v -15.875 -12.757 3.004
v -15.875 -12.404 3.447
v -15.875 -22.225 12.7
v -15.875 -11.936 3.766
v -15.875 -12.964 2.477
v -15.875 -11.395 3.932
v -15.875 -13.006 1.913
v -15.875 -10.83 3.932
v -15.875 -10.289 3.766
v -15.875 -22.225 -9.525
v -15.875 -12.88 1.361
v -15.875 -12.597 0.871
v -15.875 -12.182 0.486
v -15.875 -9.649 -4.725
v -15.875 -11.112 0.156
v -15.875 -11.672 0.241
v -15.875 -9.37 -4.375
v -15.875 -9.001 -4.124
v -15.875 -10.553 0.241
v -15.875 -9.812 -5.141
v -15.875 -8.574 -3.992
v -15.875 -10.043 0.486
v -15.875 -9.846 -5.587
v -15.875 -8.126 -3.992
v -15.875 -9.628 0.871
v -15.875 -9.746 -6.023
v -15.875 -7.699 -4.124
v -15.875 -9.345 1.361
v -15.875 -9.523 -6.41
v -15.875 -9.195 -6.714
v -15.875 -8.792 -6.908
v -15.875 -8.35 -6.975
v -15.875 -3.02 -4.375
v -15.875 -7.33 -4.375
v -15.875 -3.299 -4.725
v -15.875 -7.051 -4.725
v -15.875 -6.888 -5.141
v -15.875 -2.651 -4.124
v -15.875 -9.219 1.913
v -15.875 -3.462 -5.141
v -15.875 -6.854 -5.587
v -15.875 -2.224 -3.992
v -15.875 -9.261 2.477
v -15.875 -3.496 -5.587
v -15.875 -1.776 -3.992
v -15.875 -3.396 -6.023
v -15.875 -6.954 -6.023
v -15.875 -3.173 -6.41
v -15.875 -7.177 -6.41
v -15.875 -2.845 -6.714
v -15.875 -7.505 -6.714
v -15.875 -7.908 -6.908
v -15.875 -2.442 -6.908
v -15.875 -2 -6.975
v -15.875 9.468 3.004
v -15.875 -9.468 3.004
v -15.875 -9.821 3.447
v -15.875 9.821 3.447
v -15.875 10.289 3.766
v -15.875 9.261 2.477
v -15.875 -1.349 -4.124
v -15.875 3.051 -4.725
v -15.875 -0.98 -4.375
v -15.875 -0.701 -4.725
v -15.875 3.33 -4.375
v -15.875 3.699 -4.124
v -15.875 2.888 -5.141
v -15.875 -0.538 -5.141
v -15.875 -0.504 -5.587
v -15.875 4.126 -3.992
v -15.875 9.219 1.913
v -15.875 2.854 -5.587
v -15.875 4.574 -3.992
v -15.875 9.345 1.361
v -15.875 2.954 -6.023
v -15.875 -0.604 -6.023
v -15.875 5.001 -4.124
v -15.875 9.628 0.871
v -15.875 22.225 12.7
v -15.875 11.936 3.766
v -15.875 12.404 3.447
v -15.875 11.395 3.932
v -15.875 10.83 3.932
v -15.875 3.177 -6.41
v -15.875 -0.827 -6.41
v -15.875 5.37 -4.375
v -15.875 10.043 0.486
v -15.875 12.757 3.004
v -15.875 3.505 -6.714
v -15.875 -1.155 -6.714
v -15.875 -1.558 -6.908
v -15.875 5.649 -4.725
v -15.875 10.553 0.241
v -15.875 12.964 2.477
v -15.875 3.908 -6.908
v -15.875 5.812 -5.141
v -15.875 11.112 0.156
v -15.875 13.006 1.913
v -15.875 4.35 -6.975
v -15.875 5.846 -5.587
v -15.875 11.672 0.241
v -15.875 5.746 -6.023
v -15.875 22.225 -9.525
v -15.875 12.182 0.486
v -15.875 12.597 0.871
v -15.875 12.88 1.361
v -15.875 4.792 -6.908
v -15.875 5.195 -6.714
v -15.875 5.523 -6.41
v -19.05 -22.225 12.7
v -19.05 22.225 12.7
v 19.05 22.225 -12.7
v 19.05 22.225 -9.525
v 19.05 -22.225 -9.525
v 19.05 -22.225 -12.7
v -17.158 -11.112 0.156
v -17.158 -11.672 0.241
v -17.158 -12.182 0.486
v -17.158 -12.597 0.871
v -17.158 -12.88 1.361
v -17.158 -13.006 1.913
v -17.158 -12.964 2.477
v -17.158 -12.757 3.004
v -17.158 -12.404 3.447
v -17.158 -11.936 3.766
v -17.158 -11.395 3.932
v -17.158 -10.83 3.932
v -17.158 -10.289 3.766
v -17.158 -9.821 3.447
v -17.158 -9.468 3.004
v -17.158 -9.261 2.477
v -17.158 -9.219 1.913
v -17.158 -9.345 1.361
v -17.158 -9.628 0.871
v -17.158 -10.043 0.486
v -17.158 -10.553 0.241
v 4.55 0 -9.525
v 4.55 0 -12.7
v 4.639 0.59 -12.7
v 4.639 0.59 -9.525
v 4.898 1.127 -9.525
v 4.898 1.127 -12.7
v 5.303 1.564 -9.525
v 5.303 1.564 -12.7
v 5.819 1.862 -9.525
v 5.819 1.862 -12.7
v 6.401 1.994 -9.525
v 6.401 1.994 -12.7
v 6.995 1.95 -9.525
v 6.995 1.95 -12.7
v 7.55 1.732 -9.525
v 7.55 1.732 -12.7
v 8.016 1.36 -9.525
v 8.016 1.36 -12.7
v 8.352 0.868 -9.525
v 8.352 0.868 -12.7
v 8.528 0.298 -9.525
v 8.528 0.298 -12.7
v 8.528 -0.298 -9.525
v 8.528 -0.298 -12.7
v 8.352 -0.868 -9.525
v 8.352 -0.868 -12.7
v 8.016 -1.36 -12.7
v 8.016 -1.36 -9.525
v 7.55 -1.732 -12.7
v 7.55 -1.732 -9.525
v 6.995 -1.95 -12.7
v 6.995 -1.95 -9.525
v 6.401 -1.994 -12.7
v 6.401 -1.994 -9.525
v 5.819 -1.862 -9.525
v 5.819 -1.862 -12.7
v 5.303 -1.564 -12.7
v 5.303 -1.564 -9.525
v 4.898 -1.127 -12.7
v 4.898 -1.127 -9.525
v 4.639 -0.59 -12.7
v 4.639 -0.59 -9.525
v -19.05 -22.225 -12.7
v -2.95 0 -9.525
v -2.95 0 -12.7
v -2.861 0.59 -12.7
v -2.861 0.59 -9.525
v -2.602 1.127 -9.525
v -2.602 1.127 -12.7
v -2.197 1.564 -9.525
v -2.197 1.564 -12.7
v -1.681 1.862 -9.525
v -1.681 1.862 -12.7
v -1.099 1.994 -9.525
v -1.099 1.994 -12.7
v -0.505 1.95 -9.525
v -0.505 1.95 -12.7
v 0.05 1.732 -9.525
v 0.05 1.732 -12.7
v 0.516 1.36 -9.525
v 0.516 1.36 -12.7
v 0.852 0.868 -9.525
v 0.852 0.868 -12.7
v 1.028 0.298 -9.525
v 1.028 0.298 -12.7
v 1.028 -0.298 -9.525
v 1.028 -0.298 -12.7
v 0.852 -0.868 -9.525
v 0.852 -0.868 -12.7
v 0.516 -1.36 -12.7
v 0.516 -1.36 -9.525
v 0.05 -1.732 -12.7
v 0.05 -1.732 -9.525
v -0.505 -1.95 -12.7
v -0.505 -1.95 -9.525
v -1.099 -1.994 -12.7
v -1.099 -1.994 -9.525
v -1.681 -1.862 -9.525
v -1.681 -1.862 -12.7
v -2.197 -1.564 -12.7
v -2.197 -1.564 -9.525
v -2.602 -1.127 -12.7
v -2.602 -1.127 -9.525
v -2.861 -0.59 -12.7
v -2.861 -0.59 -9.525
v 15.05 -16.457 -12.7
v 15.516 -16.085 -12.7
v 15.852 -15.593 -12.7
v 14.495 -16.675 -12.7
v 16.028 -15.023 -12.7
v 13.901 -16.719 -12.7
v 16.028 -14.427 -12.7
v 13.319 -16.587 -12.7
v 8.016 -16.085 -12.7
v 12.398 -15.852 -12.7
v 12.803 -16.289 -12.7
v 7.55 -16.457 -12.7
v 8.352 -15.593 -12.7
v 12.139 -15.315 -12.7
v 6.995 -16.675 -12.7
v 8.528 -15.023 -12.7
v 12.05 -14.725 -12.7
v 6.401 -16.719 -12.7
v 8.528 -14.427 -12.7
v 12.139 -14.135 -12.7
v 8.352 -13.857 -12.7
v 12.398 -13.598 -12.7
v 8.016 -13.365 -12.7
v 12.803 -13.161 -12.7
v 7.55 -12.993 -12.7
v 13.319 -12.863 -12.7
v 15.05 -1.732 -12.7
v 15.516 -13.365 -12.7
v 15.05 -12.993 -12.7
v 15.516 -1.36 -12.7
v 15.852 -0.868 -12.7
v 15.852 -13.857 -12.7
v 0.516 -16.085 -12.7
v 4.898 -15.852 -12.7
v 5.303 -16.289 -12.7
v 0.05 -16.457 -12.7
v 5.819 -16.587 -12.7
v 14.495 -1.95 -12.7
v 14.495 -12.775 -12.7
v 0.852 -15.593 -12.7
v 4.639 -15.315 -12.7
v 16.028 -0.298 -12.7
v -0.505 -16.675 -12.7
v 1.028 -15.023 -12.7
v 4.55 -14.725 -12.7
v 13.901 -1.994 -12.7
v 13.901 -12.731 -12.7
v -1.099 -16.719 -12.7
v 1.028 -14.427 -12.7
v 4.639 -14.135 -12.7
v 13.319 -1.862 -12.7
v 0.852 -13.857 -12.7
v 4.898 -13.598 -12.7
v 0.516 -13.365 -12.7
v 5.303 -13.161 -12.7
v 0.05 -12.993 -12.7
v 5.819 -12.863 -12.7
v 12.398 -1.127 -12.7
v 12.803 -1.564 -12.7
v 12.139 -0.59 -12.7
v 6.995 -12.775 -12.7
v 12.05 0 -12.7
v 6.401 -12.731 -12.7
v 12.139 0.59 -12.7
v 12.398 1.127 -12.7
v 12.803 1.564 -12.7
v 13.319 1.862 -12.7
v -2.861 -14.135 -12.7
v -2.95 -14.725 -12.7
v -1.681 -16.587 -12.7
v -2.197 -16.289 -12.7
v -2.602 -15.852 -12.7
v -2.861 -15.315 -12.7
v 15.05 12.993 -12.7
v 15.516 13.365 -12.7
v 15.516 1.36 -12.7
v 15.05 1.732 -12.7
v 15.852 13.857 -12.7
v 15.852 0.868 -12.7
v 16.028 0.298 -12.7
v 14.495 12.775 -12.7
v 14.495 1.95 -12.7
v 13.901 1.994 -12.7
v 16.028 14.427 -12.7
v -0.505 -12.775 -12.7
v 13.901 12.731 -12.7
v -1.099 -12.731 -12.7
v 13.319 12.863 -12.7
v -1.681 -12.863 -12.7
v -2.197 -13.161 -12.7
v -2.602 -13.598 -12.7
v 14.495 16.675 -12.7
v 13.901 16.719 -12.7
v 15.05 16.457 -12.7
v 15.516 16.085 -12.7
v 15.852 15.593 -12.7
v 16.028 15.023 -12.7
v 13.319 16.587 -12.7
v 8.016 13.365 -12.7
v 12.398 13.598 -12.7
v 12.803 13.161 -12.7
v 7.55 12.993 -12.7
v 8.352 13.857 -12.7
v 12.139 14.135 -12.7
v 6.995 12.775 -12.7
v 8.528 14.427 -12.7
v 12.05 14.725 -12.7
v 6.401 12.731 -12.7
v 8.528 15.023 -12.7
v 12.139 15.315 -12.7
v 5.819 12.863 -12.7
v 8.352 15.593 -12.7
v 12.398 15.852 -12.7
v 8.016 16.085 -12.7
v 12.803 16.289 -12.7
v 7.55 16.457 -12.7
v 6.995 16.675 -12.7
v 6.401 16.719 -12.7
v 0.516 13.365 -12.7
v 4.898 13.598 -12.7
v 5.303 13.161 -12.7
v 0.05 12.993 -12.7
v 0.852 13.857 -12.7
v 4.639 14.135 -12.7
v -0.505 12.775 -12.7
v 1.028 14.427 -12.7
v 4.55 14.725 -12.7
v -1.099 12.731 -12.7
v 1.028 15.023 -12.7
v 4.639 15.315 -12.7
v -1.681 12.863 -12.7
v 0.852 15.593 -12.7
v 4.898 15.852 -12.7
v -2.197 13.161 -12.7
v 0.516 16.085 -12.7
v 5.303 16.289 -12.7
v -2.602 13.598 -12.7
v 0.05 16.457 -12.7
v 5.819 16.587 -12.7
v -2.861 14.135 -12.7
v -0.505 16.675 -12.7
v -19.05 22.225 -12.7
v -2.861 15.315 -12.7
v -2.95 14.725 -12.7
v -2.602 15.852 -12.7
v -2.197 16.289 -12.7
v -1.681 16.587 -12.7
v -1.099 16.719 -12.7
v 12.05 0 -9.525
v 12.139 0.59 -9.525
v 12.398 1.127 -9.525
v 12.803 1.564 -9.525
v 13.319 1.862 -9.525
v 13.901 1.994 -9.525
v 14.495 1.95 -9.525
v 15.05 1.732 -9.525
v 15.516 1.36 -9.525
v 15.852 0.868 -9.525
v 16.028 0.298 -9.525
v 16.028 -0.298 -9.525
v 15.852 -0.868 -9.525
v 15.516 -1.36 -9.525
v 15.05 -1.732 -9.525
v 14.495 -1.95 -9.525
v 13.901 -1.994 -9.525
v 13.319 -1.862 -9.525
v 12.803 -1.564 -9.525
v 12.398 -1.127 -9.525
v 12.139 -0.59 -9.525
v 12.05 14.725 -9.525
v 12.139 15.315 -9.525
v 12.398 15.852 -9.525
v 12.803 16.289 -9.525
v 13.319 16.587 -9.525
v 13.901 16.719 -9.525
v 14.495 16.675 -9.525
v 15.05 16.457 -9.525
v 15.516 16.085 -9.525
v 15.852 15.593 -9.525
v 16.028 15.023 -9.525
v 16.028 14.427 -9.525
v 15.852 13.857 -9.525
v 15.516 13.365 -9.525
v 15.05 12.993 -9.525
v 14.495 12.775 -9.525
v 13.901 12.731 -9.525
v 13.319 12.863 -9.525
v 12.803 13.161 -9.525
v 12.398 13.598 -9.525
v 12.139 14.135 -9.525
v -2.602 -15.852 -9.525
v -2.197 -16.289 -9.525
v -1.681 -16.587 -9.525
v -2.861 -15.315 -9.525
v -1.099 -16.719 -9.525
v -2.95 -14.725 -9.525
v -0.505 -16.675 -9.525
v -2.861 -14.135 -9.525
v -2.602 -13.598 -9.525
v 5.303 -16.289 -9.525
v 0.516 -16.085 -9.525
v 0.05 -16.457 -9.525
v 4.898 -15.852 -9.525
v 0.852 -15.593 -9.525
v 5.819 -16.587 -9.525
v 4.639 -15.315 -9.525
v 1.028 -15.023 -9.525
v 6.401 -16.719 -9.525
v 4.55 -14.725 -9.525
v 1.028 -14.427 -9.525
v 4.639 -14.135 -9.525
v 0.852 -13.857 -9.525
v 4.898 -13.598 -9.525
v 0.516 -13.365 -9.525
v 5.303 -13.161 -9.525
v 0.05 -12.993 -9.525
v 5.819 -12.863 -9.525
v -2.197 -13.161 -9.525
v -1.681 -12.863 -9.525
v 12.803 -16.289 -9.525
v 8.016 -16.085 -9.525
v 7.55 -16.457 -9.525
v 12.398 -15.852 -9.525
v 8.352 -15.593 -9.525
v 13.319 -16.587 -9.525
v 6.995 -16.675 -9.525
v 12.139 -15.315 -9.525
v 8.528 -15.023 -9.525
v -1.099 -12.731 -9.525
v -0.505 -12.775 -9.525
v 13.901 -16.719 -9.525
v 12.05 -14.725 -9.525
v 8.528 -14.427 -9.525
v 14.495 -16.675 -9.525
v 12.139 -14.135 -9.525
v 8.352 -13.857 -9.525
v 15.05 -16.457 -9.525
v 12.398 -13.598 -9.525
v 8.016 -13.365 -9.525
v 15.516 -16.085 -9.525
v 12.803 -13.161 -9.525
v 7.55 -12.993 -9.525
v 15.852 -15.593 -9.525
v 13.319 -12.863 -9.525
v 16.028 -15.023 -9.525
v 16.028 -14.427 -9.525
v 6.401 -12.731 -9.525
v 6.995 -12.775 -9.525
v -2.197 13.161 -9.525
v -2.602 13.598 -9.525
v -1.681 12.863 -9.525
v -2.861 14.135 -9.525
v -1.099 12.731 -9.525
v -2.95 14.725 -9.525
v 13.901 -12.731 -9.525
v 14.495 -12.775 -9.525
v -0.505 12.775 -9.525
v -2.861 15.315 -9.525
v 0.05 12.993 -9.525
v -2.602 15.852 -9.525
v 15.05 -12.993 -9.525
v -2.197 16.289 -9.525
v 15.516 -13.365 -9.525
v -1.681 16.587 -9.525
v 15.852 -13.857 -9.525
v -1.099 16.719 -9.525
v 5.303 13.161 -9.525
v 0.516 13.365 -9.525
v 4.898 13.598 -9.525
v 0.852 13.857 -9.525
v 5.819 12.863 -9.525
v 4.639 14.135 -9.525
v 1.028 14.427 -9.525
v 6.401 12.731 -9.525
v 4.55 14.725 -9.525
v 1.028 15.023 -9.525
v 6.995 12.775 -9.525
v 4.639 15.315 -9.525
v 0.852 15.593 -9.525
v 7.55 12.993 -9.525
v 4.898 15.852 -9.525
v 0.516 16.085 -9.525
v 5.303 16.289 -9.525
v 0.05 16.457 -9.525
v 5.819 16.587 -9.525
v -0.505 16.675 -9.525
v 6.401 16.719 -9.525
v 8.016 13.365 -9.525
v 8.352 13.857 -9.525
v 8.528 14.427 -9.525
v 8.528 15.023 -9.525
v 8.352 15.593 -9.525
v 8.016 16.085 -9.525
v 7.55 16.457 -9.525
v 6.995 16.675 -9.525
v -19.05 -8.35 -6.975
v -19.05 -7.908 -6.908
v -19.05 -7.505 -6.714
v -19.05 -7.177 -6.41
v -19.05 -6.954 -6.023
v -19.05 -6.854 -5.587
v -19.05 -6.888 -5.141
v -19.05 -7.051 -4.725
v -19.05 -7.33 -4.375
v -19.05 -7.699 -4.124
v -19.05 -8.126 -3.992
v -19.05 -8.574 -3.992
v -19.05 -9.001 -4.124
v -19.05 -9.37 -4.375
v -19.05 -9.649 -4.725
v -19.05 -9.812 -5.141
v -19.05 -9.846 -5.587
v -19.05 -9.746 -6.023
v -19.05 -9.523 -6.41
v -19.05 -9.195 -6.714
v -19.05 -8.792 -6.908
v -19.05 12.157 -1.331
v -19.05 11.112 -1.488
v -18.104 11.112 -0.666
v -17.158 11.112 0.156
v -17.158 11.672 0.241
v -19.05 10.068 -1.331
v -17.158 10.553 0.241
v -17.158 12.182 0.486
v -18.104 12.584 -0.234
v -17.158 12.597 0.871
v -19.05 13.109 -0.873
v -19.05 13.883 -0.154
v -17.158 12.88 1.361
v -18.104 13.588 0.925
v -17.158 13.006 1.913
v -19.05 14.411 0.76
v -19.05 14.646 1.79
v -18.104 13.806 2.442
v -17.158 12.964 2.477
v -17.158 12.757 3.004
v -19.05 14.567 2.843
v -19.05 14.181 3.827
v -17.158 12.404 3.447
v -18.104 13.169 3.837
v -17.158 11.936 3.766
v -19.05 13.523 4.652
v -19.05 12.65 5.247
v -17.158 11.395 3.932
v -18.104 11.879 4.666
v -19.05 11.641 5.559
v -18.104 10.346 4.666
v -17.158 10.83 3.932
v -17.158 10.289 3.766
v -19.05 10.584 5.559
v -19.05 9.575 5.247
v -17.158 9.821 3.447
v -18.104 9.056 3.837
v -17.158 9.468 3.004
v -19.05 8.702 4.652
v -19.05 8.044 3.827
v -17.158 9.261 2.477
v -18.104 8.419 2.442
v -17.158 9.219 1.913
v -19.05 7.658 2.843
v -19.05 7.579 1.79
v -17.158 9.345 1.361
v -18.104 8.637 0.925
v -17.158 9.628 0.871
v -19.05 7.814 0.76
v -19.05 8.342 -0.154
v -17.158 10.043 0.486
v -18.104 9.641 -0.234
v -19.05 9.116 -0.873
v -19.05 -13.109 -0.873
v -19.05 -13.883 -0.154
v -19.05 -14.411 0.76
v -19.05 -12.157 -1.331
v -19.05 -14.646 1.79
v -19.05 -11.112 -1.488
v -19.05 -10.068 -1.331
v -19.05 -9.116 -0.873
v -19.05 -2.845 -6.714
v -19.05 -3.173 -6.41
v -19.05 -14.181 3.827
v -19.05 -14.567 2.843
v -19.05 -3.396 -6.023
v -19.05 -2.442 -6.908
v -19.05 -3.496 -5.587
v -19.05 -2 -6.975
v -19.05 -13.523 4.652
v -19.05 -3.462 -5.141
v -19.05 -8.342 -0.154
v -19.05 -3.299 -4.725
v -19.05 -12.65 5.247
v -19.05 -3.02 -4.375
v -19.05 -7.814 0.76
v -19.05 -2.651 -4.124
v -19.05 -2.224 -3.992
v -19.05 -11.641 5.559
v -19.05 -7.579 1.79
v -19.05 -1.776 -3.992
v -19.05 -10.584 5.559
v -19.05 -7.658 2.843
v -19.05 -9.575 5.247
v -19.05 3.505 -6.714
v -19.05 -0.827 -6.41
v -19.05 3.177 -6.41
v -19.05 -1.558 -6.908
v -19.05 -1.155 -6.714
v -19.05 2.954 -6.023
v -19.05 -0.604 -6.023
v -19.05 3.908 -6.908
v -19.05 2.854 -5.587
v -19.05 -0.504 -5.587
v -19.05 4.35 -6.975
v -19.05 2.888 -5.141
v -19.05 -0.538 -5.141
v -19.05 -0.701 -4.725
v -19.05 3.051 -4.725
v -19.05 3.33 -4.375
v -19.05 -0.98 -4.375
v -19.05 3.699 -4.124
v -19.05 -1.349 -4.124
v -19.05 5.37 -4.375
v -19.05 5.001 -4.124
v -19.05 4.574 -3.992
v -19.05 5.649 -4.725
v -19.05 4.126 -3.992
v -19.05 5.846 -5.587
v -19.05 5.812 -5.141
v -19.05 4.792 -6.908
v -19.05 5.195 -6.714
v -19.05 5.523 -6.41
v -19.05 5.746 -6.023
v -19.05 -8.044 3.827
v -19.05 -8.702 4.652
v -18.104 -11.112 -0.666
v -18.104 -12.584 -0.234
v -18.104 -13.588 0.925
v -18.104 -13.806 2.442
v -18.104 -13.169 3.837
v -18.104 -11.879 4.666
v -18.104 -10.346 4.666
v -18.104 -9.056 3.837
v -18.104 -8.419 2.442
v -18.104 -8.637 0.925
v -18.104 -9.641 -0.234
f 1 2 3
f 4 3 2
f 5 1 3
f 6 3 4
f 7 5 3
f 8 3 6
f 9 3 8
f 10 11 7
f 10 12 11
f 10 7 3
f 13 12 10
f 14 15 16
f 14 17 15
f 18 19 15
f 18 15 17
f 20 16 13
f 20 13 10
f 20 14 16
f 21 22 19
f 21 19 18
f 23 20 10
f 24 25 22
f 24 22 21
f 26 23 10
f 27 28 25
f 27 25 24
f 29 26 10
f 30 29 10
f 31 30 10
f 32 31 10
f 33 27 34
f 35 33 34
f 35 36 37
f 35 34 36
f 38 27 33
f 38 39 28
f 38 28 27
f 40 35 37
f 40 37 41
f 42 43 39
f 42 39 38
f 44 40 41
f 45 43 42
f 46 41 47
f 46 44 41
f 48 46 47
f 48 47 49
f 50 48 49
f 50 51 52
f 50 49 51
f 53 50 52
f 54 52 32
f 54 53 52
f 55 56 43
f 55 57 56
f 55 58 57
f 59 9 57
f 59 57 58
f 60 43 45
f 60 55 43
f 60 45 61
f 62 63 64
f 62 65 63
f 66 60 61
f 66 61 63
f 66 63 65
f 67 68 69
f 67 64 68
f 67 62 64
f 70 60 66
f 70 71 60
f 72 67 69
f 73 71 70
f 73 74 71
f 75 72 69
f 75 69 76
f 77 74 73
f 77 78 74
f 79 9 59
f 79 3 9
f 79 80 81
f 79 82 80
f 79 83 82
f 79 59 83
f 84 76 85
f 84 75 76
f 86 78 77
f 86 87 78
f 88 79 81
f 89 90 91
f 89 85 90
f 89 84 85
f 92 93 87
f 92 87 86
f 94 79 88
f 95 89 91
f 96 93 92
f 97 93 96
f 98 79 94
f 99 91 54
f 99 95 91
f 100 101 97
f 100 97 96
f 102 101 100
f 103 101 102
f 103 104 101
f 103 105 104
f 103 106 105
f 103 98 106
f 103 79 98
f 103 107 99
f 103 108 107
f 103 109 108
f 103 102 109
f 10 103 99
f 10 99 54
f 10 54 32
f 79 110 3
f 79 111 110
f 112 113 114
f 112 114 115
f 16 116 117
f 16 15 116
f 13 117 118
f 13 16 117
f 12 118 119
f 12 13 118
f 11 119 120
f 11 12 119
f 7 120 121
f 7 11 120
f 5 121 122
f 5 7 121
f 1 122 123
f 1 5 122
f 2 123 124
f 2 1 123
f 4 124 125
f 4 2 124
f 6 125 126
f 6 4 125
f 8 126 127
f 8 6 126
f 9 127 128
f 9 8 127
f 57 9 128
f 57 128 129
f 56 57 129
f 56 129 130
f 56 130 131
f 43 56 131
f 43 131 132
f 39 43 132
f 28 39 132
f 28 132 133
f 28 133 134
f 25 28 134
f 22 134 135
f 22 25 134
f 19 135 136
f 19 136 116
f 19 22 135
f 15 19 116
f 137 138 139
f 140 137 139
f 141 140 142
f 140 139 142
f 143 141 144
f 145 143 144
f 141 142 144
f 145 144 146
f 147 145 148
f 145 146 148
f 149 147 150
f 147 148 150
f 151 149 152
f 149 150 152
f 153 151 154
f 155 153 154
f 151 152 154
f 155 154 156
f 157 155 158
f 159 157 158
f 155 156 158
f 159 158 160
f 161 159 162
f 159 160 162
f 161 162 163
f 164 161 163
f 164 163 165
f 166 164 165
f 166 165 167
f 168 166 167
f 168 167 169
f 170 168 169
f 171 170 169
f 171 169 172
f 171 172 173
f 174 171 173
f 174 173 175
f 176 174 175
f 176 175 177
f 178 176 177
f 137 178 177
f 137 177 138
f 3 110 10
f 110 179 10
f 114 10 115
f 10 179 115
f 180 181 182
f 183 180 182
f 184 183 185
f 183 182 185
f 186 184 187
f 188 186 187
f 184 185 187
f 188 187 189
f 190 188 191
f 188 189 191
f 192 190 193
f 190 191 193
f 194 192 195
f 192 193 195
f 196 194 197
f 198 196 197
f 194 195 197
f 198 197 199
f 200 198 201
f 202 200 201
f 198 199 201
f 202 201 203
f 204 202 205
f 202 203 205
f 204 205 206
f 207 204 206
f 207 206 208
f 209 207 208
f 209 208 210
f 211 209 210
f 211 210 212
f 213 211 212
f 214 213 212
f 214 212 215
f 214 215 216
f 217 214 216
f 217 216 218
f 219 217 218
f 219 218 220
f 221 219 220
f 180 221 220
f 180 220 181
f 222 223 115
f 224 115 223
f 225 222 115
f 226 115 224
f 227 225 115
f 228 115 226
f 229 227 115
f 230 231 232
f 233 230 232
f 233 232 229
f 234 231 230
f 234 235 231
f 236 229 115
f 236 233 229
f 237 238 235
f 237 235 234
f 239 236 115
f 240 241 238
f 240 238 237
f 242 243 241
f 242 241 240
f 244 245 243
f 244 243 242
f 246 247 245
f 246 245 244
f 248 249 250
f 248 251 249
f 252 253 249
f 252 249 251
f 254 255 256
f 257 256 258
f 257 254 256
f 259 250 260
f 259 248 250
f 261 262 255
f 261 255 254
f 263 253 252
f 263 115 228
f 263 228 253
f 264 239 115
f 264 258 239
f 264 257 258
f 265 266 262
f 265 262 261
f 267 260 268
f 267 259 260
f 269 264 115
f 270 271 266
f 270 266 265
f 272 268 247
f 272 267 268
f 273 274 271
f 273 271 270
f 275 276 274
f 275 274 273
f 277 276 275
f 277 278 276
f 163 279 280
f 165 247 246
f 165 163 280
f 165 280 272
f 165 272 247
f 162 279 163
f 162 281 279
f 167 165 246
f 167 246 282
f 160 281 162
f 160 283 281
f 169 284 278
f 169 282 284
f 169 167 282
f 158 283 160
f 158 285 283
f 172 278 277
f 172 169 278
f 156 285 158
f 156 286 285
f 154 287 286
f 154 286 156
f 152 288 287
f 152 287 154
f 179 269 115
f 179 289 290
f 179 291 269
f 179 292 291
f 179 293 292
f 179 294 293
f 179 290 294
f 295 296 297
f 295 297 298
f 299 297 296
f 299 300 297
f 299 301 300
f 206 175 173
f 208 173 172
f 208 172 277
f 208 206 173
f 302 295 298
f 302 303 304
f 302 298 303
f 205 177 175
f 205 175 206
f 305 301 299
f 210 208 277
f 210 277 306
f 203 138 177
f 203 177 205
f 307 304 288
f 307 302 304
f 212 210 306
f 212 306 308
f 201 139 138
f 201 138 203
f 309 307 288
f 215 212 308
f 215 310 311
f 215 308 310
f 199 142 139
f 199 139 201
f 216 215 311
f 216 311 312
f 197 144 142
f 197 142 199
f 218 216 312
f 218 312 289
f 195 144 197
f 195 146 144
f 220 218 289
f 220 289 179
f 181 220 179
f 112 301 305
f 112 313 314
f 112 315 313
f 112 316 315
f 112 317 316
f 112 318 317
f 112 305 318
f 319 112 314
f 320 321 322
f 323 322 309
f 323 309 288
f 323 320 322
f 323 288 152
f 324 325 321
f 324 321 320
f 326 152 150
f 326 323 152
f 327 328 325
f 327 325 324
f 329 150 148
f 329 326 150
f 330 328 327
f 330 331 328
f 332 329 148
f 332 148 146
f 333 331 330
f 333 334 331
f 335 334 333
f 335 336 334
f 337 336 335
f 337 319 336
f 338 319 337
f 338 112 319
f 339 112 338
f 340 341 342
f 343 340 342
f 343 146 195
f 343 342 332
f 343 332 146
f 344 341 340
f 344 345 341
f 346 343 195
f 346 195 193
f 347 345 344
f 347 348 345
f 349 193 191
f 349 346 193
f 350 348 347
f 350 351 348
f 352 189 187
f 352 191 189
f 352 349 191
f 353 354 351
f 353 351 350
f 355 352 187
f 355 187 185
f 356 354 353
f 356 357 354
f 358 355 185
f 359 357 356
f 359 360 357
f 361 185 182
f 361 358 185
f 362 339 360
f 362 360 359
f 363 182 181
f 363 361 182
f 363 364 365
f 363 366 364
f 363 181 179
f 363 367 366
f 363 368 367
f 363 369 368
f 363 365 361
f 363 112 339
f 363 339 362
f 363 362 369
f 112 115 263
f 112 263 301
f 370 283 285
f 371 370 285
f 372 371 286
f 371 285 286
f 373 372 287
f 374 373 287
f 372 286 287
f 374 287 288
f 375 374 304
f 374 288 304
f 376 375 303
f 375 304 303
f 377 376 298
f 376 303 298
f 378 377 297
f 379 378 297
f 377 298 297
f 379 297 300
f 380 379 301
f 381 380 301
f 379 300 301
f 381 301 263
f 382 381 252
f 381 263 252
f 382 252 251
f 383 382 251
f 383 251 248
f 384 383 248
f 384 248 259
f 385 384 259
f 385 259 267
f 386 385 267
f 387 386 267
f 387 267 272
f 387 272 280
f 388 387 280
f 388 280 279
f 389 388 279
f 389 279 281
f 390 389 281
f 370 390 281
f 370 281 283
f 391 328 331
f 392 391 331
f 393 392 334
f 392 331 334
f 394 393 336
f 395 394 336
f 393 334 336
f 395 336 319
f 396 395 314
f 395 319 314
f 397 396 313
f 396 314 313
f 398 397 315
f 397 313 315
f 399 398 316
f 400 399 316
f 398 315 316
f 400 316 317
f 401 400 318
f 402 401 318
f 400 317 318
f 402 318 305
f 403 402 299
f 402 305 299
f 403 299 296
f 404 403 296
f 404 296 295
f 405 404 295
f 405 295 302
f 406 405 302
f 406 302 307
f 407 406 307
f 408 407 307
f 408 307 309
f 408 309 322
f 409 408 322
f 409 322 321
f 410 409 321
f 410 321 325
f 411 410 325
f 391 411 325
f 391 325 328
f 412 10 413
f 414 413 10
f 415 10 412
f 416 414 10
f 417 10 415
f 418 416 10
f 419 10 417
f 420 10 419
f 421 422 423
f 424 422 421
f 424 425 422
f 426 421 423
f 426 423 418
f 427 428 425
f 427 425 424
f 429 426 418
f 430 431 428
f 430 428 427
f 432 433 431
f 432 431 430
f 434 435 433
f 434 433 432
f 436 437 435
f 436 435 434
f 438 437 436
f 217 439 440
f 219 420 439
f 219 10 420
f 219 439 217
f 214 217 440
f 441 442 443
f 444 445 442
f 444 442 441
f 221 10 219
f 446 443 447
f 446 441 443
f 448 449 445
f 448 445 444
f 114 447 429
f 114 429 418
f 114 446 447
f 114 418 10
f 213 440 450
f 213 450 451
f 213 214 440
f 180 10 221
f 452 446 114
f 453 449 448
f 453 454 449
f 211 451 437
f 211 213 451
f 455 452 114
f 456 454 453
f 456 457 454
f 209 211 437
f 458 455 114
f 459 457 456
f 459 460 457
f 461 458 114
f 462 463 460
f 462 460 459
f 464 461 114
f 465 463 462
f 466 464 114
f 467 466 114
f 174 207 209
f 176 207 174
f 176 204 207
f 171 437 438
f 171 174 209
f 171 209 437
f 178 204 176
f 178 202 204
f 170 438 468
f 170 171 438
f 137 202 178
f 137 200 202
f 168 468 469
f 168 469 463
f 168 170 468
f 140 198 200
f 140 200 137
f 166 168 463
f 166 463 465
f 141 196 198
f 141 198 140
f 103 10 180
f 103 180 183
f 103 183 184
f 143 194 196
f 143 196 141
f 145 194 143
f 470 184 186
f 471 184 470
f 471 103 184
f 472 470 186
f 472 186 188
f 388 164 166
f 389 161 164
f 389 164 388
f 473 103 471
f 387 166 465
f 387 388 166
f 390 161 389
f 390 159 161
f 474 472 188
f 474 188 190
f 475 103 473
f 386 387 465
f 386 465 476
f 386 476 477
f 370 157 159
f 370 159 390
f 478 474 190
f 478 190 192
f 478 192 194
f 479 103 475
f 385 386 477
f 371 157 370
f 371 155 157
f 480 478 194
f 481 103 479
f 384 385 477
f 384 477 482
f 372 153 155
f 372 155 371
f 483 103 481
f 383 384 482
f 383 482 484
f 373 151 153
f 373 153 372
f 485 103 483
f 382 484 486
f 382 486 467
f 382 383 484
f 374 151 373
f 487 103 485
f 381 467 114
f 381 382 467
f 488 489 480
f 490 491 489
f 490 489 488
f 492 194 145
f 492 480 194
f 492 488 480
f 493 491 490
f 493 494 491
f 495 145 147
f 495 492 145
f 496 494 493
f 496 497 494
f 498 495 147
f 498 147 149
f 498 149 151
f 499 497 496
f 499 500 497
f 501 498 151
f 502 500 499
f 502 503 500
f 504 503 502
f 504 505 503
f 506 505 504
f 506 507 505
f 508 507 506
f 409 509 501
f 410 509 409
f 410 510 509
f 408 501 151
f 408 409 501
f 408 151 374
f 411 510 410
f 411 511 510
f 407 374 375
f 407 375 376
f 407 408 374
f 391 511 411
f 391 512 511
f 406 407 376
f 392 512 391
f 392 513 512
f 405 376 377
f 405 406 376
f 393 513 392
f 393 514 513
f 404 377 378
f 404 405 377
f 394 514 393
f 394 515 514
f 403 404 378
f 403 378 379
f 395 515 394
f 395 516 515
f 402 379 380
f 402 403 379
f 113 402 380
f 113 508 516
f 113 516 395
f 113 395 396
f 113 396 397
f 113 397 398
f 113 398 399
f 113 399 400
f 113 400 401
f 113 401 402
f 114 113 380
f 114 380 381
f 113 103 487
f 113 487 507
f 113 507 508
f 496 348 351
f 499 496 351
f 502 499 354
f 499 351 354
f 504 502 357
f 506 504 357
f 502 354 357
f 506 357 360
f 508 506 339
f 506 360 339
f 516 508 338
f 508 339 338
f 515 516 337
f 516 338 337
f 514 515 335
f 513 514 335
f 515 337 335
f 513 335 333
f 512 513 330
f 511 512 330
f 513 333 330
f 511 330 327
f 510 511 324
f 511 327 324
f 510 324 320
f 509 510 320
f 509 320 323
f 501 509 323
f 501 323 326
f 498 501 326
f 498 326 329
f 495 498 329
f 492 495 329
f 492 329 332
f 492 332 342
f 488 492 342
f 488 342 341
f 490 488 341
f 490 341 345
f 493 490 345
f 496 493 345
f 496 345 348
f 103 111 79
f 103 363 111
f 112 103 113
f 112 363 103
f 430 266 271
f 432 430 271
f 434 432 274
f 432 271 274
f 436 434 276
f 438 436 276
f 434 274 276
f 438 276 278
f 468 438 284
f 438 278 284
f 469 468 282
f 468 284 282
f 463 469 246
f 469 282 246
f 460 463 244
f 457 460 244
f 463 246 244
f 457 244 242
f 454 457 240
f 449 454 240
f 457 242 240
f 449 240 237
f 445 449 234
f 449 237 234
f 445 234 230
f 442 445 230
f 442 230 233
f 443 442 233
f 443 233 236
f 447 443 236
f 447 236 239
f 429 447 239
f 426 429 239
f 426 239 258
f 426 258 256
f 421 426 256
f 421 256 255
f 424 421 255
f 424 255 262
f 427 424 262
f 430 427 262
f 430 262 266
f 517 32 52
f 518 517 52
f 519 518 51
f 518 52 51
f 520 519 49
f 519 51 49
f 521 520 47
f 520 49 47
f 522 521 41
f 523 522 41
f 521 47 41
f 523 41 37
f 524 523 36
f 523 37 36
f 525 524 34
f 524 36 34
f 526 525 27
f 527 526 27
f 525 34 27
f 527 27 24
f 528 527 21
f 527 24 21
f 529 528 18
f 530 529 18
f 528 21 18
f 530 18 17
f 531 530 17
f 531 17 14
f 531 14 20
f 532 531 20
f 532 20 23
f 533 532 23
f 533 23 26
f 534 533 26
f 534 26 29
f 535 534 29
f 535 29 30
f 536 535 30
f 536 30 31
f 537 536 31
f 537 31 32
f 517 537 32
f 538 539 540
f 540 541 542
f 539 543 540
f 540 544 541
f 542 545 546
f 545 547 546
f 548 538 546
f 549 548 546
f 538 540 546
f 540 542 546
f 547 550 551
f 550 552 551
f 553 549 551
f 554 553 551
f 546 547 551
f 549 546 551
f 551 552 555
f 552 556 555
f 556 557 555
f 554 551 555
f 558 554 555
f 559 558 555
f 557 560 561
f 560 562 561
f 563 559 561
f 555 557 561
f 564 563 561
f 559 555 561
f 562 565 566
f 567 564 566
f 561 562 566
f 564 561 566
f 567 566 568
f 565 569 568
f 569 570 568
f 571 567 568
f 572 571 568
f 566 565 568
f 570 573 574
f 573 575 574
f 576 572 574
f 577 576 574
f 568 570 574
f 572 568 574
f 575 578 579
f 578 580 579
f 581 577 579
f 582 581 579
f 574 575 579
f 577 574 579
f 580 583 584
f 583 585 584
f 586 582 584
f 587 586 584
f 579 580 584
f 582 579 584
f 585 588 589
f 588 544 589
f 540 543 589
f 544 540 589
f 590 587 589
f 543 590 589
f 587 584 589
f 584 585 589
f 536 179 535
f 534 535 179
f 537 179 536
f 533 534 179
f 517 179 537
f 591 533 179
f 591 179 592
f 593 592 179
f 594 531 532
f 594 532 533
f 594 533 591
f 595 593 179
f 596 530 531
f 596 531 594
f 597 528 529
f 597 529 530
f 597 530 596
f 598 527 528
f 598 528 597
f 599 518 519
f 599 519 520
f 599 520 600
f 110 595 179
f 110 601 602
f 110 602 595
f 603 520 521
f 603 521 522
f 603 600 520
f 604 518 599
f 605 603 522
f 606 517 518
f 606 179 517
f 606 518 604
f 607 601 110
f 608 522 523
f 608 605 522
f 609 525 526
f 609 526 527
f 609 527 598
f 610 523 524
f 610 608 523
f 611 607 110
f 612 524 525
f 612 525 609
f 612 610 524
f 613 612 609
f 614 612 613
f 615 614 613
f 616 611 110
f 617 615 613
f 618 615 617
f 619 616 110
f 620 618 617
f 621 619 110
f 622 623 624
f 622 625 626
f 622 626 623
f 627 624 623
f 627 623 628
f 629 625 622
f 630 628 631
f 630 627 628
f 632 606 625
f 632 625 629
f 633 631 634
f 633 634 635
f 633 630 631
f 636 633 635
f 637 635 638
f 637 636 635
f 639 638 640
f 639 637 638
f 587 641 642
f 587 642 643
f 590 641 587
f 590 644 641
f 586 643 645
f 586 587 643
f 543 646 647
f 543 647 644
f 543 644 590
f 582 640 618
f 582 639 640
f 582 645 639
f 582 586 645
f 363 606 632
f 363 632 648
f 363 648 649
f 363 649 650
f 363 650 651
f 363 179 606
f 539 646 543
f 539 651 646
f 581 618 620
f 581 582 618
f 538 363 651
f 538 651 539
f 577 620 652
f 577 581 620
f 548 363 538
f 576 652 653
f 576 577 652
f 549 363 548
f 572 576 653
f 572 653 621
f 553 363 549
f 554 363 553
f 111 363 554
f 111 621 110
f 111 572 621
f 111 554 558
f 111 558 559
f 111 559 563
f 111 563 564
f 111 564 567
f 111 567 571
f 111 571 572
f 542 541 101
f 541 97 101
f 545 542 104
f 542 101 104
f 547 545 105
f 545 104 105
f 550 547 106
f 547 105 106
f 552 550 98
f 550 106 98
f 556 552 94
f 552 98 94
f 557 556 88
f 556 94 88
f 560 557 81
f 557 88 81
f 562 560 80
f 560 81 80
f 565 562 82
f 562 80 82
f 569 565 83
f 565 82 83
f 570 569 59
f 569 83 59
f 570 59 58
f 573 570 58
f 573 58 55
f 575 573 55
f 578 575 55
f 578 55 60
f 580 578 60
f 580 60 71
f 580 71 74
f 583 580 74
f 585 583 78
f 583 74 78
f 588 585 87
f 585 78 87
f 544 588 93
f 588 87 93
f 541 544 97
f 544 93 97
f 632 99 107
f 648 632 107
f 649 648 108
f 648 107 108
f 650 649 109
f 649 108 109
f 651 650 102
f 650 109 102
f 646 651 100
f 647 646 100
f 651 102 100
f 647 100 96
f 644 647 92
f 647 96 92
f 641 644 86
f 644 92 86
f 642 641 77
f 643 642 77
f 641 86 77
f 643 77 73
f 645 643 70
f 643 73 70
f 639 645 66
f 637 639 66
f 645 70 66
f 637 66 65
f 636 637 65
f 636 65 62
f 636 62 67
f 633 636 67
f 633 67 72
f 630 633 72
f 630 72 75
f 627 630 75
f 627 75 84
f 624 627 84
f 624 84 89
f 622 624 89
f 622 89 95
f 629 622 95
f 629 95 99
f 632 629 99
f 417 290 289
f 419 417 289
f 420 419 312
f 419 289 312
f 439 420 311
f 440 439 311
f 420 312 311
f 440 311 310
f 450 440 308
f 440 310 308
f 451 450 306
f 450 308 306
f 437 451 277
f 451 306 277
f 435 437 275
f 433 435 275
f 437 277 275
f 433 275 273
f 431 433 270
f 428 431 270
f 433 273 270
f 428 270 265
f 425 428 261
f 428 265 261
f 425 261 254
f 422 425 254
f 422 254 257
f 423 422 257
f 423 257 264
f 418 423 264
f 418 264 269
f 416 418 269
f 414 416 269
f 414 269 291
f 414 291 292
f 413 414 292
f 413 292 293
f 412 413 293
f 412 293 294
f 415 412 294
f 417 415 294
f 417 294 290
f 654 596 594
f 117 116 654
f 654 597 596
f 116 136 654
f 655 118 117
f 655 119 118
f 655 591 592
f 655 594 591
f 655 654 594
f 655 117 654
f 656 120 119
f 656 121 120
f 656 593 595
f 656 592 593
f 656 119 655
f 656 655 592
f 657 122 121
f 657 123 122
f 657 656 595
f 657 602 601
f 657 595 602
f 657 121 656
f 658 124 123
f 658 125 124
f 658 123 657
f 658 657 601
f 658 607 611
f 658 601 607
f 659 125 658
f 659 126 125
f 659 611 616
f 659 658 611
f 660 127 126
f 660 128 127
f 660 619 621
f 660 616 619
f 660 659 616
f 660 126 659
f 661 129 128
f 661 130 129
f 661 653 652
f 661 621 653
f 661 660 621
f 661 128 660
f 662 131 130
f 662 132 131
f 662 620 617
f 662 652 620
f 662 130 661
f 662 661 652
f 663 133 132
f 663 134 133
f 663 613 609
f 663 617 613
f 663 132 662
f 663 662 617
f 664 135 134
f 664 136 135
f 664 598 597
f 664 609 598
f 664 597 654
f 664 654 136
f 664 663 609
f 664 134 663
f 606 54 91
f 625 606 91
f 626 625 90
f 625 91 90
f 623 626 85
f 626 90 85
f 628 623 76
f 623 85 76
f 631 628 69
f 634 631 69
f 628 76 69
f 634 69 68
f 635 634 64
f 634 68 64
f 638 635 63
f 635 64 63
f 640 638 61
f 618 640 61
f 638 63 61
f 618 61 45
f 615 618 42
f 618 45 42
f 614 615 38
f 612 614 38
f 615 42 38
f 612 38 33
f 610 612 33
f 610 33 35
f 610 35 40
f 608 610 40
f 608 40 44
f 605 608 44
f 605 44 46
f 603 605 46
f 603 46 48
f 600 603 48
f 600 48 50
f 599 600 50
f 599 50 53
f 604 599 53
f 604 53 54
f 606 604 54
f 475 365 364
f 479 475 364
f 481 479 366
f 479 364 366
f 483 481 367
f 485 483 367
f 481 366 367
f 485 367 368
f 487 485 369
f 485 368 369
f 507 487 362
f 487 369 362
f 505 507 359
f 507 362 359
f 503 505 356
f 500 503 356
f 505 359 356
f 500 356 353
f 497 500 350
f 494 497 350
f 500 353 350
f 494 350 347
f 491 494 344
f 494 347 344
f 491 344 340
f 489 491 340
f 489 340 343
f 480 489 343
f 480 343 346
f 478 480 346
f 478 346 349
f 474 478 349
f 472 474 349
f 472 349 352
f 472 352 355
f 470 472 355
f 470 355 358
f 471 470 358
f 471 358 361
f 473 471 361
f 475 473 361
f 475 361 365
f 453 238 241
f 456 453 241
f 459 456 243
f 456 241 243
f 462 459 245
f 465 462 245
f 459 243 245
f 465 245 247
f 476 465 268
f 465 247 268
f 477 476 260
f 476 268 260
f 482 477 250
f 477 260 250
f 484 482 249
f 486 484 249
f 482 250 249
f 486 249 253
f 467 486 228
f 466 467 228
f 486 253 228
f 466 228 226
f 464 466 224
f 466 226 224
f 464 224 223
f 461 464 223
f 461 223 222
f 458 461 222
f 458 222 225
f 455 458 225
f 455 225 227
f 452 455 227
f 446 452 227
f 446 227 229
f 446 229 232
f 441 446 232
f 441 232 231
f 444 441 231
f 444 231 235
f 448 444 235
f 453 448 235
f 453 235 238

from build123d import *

# Parameters (mm, degrees)
BOSS_EXTRUDE1_DEPTH                            = 22.225
CSK_FOR_6_FLAT_HEAD_MACHINE_SCREW1_D           = 3.7973
CSK_FOR_6_FLAT_HEAD_MACHINE_SCREW1_CSINK_D     = 7.0866
CSK_FOR_6_FLAT_HEAD_MACHINE_SCREW1_CSINK_ANGLE = 82
SKETCH6_R                                      = 2
CUT_EXTRUDE2_DEPTH                             = 26.4
SKETCH7_R                                      = 1.5
CUT_EXTRUDE3_DEPTH                             = 4.175


with BuildPart() as part:
    # Sketch1 → Boss-Extrude1 (new body, symmetric)
    with BuildSketch(Plane(origin=(0, 0, 0), x_dir=(1, 0, 0), z_dir=(0, 1, 0))):
        Polygon((-19.05, -12.7), (-15.875, -12.7), (-15.875, 9.525), (19.05, 9.525), (19.05, 12.7), (-19.05, 12.7), align=None)
    extrude(amount=BOSS_EXTRUDE1_DEPTH, both=True)

    # CSK for #6 Flat Head Machine Screw1 (through all)
    with Locations(Plane.ZY.offset(19.05)):
        with Locations((2.055, 11.1125)):
            csk_for_6_flat_head_machine_screw1 = CounterSinkHole(CSK_FOR_6_FLAT_HEAD_MACHINE_SCREW1_D / 2, CSK_FOR_6_FLAT_HEAD_MACHINE_SCREW1_CSINK_D / 2, counter_sink_angle=CSK_FOR_6_FLAT_HEAD_MACHINE_SCREW1_CSINK_ANGLE)

    # Sketch6 → Cut-Extrude2 (cut, through all)
    with BuildSketch(Plane(origin=(0, 0, -12.7), x_dir=(-1, 0, 0), z_dir=(0, 0, -1))):
        with Locations((-14.05, -14.725)):
            Circle(SKETCH6_R)
        with Locations((-6.55, -14.725)):
            Circle(SKETCH6_R)
        with Locations((-6.55, 0)):
            Circle(SKETCH6_R)
        with Locations((-6.55, 14.725)):
            Circle(SKETCH6_R)
        with Locations((-14.05, 0)):
            Circle(SKETCH6_R)
        with Locations((-14.05, 14.725)):
            Circle(SKETCH6_R)
        with Locations((0.95, -14.725)):
            Circle(SKETCH6_R)
        with Locations((0.95, 0)):
            Circle(SKETCH6_R)
        with Locations((0.95, 14.725)):
            Circle(SKETCH6_R)
    extrude(amount=-CUT_EXTRUDE2_DEPTH, mode=Mode.SUBTRACT)

    # Mirror1: CSK for #6 Flat Head Machine Screw1 across plane
    add(csk_for_6_flat_head_machine_screw1.mirror(Plane.ZX), mode=Mode.SUBTRACT)

    # Sketch7 → Cut-Extrude3 (cut, through all)
    with BuildSketch(Plane(origin=(-15.875, 0, 0), x_dir=(0, 0, -1), z_dir=(1, 0, 0))):
        with Locations((5.475, -2)):
            Circle(SKETCH7_R)
        with Locations((5.475, -8.35)):
            Circle(SKETCH7_R)
        with Locations((5.475, 4.35)):
            Circle(SKETCH7_R)
    extrude(amount=-CUT_EXTRUDE3_DEPTH, mode=Mode.SUBTRACT)


solid = part.part
